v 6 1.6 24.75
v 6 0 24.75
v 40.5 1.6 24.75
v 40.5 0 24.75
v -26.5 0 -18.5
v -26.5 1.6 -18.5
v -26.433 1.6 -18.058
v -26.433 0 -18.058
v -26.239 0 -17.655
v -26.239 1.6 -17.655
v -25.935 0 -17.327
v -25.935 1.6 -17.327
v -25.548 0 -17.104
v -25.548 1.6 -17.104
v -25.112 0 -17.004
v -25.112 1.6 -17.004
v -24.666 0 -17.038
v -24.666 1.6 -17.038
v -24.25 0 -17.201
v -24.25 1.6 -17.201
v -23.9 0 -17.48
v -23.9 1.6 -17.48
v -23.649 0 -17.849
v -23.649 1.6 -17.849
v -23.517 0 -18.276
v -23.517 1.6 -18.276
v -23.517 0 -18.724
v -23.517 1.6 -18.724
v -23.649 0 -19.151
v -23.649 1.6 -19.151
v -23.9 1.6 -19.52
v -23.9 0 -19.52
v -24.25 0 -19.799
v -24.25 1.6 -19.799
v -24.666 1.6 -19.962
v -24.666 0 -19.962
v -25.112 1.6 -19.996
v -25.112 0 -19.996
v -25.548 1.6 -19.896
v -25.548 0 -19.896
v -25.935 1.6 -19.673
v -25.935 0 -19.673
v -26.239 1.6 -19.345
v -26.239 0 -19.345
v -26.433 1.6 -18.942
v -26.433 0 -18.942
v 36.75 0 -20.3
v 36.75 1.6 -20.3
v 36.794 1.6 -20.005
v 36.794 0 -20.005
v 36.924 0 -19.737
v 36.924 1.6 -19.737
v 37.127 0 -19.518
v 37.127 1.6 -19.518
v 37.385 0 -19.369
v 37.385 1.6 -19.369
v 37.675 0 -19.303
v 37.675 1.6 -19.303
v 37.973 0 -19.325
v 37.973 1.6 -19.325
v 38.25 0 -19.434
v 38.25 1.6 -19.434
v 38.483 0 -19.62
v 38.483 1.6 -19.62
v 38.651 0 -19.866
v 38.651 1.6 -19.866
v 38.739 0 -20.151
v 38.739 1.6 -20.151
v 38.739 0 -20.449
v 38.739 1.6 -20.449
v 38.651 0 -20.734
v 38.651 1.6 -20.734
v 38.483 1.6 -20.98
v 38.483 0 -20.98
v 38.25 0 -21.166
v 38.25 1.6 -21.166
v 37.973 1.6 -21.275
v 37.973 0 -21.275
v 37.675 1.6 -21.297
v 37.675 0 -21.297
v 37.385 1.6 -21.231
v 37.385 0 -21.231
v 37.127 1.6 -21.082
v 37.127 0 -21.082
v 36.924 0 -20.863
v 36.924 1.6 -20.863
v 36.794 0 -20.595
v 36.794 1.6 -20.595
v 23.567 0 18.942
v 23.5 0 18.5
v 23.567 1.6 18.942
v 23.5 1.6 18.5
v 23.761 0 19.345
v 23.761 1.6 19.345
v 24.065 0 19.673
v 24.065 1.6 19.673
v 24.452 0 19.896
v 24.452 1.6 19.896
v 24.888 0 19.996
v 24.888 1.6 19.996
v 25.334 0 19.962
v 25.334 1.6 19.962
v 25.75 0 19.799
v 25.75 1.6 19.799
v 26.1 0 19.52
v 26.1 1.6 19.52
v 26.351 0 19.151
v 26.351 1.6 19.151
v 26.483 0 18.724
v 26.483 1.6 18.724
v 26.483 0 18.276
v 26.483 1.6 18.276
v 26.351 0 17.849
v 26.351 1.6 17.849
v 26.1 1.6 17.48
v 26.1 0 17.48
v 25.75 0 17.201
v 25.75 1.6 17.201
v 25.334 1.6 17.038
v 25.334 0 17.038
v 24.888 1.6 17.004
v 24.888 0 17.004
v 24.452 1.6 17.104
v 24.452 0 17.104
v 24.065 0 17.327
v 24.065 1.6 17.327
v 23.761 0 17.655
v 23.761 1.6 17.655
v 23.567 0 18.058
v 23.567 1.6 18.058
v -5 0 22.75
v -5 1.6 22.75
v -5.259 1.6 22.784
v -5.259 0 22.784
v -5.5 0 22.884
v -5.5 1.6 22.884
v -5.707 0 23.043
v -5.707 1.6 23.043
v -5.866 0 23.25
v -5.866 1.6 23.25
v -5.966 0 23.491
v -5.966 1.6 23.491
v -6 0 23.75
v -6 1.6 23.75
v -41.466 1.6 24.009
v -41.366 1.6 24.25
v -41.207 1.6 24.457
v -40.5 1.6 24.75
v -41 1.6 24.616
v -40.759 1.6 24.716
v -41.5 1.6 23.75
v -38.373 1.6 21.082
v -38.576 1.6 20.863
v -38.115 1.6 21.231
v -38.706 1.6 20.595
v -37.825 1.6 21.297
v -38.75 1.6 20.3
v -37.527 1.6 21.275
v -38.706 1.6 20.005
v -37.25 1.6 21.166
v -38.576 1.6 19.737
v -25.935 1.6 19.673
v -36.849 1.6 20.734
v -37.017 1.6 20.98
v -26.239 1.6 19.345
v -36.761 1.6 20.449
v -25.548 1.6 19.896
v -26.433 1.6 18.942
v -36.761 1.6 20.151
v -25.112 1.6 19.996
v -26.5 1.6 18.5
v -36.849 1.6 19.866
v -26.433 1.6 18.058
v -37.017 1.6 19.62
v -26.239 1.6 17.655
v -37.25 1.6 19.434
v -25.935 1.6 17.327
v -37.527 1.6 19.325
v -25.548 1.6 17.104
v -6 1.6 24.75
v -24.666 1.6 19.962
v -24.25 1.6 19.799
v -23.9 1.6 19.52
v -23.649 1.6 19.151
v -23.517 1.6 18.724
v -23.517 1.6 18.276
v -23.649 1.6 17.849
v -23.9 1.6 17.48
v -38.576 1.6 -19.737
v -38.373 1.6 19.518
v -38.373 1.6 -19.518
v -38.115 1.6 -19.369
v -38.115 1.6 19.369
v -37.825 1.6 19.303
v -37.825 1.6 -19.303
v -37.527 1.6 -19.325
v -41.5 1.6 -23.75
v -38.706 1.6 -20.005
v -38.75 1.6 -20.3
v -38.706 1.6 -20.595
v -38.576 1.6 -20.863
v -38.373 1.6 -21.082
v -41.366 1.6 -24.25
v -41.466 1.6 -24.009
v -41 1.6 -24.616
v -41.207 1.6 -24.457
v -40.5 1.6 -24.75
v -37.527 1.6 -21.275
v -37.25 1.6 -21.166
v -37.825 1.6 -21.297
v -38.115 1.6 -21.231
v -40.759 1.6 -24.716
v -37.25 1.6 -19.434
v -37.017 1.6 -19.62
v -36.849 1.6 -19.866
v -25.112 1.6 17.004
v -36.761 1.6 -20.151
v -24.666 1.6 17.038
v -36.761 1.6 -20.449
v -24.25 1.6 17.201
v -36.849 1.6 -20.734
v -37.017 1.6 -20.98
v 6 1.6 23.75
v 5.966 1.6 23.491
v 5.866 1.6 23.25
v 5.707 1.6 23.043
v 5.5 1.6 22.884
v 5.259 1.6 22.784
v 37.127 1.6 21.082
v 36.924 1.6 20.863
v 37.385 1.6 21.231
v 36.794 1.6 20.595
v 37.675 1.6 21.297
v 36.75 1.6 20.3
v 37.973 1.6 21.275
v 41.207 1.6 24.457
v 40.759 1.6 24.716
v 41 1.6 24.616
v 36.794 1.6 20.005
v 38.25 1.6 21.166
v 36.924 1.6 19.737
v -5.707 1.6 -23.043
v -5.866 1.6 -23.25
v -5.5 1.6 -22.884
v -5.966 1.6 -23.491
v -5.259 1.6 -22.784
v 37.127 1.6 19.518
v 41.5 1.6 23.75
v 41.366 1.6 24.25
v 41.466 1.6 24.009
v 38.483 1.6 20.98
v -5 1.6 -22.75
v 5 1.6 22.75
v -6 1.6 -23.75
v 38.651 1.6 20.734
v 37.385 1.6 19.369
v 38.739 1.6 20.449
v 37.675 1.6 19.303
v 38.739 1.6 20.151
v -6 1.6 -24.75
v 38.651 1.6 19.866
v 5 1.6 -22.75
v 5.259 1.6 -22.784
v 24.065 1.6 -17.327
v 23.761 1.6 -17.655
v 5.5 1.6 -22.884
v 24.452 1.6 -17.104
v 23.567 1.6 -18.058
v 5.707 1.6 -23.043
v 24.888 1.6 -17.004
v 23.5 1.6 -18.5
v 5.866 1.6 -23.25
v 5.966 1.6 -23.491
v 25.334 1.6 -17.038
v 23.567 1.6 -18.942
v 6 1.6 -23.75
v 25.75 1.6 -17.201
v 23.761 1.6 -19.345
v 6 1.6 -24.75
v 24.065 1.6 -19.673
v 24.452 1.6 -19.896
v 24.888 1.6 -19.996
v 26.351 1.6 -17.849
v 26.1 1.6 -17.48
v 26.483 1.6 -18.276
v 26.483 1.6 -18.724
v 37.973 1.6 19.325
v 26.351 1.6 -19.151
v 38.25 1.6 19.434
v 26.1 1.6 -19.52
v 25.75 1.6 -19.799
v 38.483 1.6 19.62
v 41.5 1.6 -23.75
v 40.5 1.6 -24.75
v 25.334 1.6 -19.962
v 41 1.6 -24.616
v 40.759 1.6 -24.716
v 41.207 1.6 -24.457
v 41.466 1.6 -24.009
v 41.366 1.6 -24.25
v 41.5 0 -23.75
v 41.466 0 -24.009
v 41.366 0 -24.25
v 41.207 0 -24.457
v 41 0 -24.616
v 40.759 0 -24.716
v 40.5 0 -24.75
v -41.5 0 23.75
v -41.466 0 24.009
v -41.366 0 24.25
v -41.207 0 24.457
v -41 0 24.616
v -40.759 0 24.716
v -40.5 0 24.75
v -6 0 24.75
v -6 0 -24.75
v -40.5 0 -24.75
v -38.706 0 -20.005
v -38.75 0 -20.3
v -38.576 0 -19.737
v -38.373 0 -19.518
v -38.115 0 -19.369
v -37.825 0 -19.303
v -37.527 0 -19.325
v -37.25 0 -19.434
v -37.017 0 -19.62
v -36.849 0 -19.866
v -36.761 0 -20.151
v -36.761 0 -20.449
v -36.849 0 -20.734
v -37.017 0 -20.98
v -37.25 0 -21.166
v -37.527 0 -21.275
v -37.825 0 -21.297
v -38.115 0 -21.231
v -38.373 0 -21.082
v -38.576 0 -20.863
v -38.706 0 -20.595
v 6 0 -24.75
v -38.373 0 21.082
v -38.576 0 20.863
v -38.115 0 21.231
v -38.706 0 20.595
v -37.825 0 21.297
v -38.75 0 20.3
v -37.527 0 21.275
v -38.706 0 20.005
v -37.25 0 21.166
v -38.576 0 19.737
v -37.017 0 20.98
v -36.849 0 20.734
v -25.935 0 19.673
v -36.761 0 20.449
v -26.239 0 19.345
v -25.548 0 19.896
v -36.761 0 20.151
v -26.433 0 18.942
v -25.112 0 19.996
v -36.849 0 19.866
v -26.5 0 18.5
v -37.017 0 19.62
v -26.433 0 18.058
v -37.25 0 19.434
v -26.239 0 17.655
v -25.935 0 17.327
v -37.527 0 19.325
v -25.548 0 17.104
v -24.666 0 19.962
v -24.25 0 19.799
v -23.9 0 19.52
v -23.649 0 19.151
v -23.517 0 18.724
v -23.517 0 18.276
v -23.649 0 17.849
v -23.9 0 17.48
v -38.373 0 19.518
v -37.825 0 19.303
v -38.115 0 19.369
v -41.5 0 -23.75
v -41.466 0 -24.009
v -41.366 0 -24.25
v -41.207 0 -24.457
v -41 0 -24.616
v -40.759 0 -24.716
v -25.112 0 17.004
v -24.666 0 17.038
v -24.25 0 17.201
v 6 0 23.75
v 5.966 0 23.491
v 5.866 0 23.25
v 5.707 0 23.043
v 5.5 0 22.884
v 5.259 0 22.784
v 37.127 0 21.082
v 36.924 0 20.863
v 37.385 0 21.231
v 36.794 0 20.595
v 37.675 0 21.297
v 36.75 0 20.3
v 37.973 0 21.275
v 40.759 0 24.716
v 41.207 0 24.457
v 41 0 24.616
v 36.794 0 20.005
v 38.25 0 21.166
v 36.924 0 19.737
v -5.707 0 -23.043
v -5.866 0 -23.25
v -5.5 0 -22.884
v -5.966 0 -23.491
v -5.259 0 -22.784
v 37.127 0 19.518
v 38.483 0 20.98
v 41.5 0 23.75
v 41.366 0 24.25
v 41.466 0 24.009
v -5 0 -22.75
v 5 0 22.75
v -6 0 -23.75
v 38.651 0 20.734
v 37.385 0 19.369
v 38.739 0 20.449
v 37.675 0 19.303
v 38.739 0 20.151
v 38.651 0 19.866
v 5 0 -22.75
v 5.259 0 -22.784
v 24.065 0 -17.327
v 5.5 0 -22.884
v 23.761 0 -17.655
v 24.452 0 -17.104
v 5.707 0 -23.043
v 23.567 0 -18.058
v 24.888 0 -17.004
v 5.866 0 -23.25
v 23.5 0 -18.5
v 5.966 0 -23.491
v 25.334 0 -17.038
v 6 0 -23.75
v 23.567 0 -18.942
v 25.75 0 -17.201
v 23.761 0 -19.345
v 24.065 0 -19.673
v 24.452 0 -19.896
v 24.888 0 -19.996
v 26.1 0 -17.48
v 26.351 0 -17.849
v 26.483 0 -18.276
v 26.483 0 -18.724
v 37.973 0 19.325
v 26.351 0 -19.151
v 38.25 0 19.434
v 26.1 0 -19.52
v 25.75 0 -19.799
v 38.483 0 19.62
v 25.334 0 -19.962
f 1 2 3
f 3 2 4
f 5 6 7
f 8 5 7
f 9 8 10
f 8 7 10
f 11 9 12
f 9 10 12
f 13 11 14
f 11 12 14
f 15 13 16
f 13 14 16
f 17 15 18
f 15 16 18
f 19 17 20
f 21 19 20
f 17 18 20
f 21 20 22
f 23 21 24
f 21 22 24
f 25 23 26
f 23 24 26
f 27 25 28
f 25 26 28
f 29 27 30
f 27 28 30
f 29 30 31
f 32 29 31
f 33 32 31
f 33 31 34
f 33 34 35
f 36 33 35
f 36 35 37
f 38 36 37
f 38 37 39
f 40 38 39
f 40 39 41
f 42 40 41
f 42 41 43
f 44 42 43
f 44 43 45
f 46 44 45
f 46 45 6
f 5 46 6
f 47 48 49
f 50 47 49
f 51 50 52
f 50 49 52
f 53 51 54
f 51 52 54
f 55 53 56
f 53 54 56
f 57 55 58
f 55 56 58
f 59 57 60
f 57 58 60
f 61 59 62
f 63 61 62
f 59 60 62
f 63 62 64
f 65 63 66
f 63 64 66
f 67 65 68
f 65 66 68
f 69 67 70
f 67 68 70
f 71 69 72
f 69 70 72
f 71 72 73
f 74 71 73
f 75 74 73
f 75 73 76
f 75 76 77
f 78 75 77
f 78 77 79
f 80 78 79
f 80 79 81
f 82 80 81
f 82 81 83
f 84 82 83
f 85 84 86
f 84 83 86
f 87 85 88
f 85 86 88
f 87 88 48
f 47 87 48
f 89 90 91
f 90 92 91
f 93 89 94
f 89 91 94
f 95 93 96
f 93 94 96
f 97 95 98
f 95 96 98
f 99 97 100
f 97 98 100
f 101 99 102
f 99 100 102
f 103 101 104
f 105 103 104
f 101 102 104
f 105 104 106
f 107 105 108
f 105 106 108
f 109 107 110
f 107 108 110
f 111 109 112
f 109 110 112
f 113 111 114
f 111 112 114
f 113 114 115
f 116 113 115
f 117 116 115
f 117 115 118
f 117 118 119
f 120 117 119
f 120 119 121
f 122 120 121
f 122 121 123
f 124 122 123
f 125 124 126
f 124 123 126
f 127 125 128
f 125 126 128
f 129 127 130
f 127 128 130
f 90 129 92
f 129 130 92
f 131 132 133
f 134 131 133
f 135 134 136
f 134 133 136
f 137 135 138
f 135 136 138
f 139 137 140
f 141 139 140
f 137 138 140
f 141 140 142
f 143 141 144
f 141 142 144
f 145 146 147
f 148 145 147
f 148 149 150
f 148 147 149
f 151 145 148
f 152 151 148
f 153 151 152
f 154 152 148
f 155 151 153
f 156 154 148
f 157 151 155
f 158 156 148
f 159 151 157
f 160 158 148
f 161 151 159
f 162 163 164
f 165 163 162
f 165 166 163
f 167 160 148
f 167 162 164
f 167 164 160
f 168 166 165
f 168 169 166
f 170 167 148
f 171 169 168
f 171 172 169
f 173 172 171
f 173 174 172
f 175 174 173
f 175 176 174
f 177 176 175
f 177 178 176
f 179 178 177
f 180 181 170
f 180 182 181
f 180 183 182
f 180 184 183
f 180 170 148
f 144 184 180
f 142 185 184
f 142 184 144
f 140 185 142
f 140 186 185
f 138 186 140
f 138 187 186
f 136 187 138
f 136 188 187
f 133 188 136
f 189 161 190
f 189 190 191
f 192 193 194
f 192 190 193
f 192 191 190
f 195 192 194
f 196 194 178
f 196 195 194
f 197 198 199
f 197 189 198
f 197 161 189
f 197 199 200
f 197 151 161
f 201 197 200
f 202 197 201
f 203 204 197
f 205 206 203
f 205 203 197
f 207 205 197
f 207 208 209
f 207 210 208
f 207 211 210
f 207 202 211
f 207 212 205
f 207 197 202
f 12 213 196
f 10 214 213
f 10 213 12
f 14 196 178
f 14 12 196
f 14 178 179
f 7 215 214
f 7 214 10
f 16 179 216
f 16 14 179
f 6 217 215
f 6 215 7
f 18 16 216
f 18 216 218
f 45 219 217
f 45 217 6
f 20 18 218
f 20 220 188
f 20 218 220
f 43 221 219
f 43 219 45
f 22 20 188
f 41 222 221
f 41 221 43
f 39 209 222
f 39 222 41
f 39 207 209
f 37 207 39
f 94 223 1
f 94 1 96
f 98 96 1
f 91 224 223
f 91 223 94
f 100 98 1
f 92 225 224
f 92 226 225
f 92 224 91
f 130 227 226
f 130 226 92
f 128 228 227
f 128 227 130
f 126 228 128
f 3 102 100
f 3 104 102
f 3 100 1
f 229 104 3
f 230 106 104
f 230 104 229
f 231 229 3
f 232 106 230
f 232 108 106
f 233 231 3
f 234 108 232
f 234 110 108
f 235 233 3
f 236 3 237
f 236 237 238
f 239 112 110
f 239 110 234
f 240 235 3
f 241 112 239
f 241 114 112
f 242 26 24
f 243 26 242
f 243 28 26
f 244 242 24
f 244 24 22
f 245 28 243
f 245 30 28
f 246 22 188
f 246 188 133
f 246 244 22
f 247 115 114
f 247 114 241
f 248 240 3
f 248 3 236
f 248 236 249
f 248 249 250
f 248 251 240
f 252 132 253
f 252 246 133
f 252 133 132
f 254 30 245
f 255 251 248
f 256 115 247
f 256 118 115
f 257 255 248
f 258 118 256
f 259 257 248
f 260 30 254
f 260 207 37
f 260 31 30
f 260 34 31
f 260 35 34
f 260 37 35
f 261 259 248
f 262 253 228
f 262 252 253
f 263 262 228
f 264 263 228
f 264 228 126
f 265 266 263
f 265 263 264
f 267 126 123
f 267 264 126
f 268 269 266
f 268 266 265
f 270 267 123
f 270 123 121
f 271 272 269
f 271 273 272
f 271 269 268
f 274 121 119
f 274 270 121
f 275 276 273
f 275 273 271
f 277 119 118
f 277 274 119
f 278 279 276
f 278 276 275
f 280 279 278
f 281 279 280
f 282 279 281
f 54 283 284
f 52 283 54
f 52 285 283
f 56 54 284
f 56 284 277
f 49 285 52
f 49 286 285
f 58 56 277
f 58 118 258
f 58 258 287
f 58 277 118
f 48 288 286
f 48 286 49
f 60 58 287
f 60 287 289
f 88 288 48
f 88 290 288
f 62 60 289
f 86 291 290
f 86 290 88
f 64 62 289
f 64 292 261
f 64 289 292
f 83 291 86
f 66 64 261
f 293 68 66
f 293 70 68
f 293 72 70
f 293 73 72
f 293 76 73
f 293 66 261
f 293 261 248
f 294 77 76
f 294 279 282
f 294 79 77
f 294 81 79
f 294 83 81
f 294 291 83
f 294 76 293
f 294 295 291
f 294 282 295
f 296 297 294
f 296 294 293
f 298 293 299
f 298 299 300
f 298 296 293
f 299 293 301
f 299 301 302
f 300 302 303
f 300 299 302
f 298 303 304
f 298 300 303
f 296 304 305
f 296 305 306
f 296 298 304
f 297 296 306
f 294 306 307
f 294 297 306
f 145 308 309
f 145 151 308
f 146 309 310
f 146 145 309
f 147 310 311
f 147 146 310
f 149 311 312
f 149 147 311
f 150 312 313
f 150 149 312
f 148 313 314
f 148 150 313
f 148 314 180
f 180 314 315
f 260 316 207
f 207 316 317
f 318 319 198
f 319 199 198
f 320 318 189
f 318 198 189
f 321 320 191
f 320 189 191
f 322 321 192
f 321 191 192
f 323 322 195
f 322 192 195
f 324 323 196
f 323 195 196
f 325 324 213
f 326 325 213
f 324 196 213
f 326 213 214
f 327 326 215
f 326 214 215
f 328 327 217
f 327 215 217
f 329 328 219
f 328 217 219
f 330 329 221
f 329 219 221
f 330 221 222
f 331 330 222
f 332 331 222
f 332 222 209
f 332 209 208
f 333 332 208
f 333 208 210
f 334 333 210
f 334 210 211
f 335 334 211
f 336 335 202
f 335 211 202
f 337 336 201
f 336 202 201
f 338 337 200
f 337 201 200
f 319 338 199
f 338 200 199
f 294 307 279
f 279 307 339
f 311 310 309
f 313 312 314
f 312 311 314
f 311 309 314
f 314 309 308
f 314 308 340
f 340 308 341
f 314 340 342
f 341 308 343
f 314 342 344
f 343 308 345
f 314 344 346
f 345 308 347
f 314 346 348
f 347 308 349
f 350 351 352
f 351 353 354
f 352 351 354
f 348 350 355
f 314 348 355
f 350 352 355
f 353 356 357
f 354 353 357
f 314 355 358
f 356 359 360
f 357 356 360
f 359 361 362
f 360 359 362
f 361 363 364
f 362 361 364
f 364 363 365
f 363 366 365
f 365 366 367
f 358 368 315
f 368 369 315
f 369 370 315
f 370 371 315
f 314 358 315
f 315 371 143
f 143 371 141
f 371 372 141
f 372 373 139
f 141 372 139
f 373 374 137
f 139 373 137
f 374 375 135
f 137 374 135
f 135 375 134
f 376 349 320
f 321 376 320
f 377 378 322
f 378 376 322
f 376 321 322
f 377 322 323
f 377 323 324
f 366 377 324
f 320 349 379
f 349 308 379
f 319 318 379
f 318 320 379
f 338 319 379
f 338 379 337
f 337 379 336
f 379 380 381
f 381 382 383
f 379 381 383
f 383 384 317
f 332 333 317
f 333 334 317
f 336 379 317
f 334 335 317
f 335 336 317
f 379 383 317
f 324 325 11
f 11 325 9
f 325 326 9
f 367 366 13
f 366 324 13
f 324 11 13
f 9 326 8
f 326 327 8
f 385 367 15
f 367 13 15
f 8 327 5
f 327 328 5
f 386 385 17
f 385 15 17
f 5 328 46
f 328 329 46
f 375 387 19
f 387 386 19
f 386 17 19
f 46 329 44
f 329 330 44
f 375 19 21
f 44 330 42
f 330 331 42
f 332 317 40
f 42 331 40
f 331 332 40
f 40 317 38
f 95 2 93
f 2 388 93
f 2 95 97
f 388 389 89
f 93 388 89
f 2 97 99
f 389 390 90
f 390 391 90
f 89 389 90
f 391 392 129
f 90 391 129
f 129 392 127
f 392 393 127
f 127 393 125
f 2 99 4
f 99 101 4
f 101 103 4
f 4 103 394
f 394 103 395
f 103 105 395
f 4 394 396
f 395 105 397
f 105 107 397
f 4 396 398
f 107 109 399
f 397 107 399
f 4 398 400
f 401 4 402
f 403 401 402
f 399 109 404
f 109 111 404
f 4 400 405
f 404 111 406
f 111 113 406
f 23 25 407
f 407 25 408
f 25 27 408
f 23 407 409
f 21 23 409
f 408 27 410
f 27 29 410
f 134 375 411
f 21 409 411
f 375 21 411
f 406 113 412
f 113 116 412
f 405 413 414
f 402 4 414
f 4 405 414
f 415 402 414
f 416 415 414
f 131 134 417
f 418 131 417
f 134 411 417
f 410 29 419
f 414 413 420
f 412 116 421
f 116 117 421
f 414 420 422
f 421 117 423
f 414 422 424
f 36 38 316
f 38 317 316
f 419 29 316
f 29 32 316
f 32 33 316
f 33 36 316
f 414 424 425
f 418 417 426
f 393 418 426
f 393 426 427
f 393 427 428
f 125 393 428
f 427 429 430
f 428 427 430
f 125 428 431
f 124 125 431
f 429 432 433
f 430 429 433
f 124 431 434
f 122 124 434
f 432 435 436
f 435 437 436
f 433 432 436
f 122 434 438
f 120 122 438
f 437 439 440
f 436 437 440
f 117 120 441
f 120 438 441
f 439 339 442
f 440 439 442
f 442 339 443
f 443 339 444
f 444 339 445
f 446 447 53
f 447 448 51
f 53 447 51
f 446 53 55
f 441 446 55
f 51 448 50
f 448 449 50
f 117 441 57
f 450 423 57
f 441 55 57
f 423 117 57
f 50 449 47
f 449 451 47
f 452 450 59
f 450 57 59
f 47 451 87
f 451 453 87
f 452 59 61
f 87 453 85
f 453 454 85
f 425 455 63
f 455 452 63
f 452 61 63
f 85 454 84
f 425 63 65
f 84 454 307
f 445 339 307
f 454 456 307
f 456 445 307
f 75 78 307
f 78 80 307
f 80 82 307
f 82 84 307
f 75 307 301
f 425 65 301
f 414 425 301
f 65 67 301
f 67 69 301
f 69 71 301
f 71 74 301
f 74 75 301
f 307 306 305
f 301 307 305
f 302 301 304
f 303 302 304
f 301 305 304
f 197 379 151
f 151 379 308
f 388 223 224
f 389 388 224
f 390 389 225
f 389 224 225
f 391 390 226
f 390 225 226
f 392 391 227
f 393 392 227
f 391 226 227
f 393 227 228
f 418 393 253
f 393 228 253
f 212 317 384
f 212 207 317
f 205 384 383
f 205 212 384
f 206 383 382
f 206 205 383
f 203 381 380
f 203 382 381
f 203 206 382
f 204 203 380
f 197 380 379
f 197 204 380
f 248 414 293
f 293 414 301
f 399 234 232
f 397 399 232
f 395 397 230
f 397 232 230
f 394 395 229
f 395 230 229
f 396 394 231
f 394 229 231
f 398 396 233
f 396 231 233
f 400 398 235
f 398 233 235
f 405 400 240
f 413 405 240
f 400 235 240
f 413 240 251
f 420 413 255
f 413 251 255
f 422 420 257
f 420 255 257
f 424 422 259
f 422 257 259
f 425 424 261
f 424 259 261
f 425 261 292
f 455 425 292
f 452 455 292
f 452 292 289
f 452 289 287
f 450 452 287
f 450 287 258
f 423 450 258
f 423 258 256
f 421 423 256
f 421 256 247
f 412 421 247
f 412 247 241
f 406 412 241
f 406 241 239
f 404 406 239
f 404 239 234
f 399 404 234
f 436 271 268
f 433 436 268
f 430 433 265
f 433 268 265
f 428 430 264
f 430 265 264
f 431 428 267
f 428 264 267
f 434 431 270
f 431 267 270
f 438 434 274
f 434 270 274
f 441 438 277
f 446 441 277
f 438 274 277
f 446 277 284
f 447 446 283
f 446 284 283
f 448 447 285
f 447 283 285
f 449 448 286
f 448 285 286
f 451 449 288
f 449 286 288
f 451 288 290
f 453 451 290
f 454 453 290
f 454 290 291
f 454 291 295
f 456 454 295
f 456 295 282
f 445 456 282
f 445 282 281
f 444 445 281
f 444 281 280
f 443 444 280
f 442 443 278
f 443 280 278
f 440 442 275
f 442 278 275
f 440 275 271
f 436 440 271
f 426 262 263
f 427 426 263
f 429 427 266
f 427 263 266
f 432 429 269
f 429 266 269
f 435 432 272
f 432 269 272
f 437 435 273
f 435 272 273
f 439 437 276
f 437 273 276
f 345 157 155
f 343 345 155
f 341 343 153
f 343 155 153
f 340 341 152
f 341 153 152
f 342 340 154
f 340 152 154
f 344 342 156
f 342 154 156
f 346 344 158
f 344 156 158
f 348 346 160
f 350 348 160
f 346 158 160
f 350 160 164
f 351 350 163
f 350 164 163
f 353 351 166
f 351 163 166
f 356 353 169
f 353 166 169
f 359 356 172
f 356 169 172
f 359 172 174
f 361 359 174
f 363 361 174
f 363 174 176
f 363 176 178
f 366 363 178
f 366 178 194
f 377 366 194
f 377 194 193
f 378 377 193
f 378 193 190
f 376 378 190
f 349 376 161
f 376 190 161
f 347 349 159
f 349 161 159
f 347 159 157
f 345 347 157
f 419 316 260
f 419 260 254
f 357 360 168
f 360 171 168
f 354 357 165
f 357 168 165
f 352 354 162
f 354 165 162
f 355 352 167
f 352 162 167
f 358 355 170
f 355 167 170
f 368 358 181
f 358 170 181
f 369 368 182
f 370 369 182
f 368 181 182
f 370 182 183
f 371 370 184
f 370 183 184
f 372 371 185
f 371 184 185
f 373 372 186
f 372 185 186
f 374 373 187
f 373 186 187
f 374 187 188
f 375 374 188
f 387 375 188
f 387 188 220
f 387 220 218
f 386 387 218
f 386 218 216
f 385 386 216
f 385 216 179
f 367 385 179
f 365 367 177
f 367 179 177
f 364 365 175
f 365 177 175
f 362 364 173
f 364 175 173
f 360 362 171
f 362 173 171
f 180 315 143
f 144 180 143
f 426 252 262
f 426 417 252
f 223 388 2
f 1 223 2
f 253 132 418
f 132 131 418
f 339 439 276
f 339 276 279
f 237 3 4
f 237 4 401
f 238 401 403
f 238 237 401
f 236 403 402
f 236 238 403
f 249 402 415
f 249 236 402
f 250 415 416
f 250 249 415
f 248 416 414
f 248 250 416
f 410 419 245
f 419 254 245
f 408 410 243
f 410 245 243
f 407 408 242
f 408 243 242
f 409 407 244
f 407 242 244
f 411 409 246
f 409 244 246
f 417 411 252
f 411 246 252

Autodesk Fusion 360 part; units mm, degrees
sketch "Sketch1" plane through (0, 0, 0) normal (0, 1, 0) x (1, 0, 0)
  line L0 (41.5, 24.75) -> (-41.5, 24.75)
  line L1 (-41.5, 24.75) -> (-41.5, -24.75)
  line L2 (-41.5, -24.75) -> (41.5, -24.75)
  line L3 (41.5, -24.75) -> (41.5, 24.75)
  line L4 (41.5, 24.75) -> (-41.5, -24.75) construction
  line L5 (-41.5, 24.75) -> (41.5, -24.75) construction
  line L6 (6, 26.75) -> (-6, 26.75)
  line L7 (-6, 26.75) -> (-6, 22.75)
  line L8 (-6, 22.75) -> (6, 22.75)
  line L9 (6, 22.75) -> (6, 26.75)
  line L10 (6, 26.75) -> (-6, 22.75) construction
  line L11 (-6, 26.75) -> (6, 22.75) construction
  line L12 (6, -26.75) -> (-6, -26.75)
  line L13 (-6, -26.75) -> (-6, -22.75)
  line L14 (-6, -22.75) -> (6, -22.75)
  line L15 (6, -22.75) -> (6, -26.75)
  point P0 (0, 24.75)
  dimension "d1" = 83
  dimension "d2" = 49.5
  dimension "d3" = 12
  dimension "d4" = 4
extrude "Extrude1" add sketch "Sketch1" along normal blind 1.6 contours L0 L1 L2 L3 L7 L8 L9 L13 L14 L15
fillet "Fillet1" radius 1 4 edges at (6, 0.8, 22.75) (-6, 0.8, 22.75) (6, 0.8, -22.75) (-6, 0.8, -22.75)
fillet "Fillet2" radius 1 4 edges at (-41.5, 0.8, -24.75) (-41.5, 0.8, 24.75) (41.5, 0.8, 24.75) (41.5, 0.8, -24.75)
sketch "Sketch2" plane through (0, 1.6, 0) normal (0, 1, 0) x (-1, 0, 0)
  arc A0 (-41.5, -23.75) -> (-40.5, -24.75) centre (-40.5, -23.75) ccw
  line L0 (-40.5, -24.75) -> (-6, -24.75)
  line L1 (-6, -24.75) -> (-6, -23.75)
  arc A1 (-5, -22.75) -> (-6, -23.75) centre (-5, -23.75) ccw
  line L2 (-5, -22.75) -> (5, -22.75)
  arc A2 (6, -23.75) -> (5, -22.75) centre (5, -23.75) ccw
  line L3 (6, -23.75) -> (6, -24.75)
  line L4 (6, -24.75) -> (40.5, -24.75)
  arc A3 (40.5, -24.75) -> (41.5, -23.75) centre (40.5, -23.75) ccw
  line L5 (41.5, -23.75) -> (41.5, 23.75)
  arc A4 (41.5, 23.75) -> (40.5, 24.75) centre (40.5, 23.75) ccw
  line L6 (40.5, 24.75) -> (6, 24.75)
  line L7 (6, 24.75) -> (6, 23.75)
  arc A5 (5, 22.75) -> (6, 23.75) centre (5, 23.75) ccw
  line L8 (5, 22.75) -> (-5, 22.75)
  arc A6 (-6, 23.75) -> (-5, 22.75) centre (-5, 23.75) ccw
  line L9 (-6, 23.75) -> (-6, 24.75)
  line L10 (-6, 24.75) -> (-40.5, 24.75)
  arc A7 (-40.5, 24.75) -> (-41.5, 23.75) centre (-40.5, 23.75) ccw
  line L11 (-41.5, 23.75) -> (-41.5, -23.75)
  circle A8 centre (25, 18.5) radius 1.5
  circle A9 centre (25, -18.5) radius 1.5
  circle A10 centre (-25, -18.5) radius 1.5
  circle A11 centre (-25, 18.5) radius 1.5
  dimension "d11" = 50
  dimension "d12" = 37
  dimension "d13" = 3
  dimension "d14" = 3
  dimension "d15" = 3
  dimension "d16" = 3
extrude "Extrude2" cut sketch "Sketch2" against normal blind 6 contours A8 | A9 | A10 | A11
sketch "Sketch3" plane through (0, 1.6, 0) normal (0, 1, 0) x (-1, 0, 0)
  circle A0 centre (25, 18.5) radius 1.5
  circle A1 centre (-25, 18.5) radius 1.5
  circle A2 centre (25, -18.5) radius 1.5
  circle A3 centre (-25, -18.5) radius 1.5
  arc A4 (-41.5, -23.75) -> (-40.5, -24.75) centre (-40.5, -23.75) ccw
  line L0 (-40.5, -24.75) -> (-6, -24.75)
  line L1 (-6, -24.75) -> (-6, -23.75)
  arc A5 (-5, -22.75) -> (-6, -23.75) centre (-5, -23.75) ccw
  line L2 (-5, -22.75) -> (5, -22.75)
  arc A6 (6, -23.75) -> (5, -22.75) centre (5, -23.75) ccw
  line L3 (6, -23.75) -> (6, -24.75)
  line L4 (6, -24.75) -> (40.5, -24.75)
  arc A7 (40.5, -24.75) -> (41.5, -23.75) centre (40.5, -23.75) ccw
  line L5 (41.5, -23.75) -> (41.5, 23.75)
  arc A8 (41.5, 23.75) -> (40.5, 24.75) centre (40.5, 23.75) ccw
  line L6 (40.5, 24.75) -> (6, 24.75)
  line L7 (6, 24.75) -> (6, 23.75)
  arc A9 (5, 22.75) -> (6, 23.75) centre (5, 23.75) ccw
  line L8 (5, 22.75) -> (-5, 22.75)
  arc A10 (-6, 23.75) -> (-5, 22.75) centre (-5, 23.75) ccw
  line L9 (-6, 23.75) -> (-6, 24.75)
  line L10 (-6, 24.75) -> (-40.5, 24.75)
  arc A11 (-40.5, 24.75) -> (-41.5, 23.75) centre (-40.5, 23.75) ccw
  line L11 (-41.5, 23.75) -> (-41.5, -23.75)
  circle A12 centre (37.75, 20.3) radius 1
  circle A13 centre (37.75, -20.3) radius 1
  circle A14 centre (-37.75, 20.3) radius 1
  circle A15 centre (-37.75, -20.3) radius 1
  dimension "d19" = 75.5
  dimension "d20" = 40.6
  dimension "d21" = 2
  dimension "d22" = 2
  dimension "d23" = 2
  dimension "d24" = 2
extrude "Extrude3" cut sketch "Sketch3" against normal blind 2 contours A12 | A13 | A14 | A15
sketch "Sketch4" plane through (0, 1.6, 0) normal (0, 1, 0) x (-1, 0, 0)
  circle A0 centre (37.75, 20.3) radius 1
  circle A1 centre (37.75, -20.3) radius 1
  circle A2 centre (-37.75, 20.3) radius 1
  circle A3 centre (-37.75, -20.3) radius 1
  circle A4 centre (25, 18.5) radius 1.5
  circle A5 centre (-25, 18.5) radius 1.5
  circle A6 centre (25, -18.5) radius 1.5
  circle A7 centre (-25, -18.5) radius 1.5
  arc A8 (-41.5, -23.75) -> (-40.5, -24.75) centre (-40.5, -23.75) ccw
  line L0 (-40.5, -24.75) -> (-6, -24.75)
  line L1 (-6, -24.75) -> (-6, -23.75)
  arc A9 (-5, -22.75) -> (-6, -23.75) centre (-5, -23.75) ccw
  line L2 (-5, -22.75) -> (5, -22.75)
  arc A10 (6, -23.75) -> (5, -22.75) centre (5, -23.75) ccw
  line L3 (6, -23.75) -> (6, -24.75)
  line L4 (6, -24.75) -> (40.5, -24.75)
  arc A11 (40.5, -24.75) -> (41.5, -23.75) centre (40.5, -23.75) ccw
  line L5 (41.5, -23.75) -> (41.5, 23.75)
  arc A12 (41.5, 23.75) -> (40.5, 24.75) centre (40.5, 23.75) ccw
  line L6 (40.5, 24.75) -> (6, 24.75)
  line L7 (6, 24.75) -> (6, 23.75)
  arc A13 (5, 22.75) -> (6, 23.75) centre (5, 23.75) ccw
  line L8 (5, 22.75) -> (-5, 22.75)
  arc A14 (-6, 23.75) -> (-5, 22.75) centre (-5, 23.75) ccw
  line L9 (-6, 23.75) -> (-6, 24.75)
  line L10 (-6, 24.75) -> (-40.5, 24.75)
  arc A15 (-40.5, 24.75) -> (-41.5, 23.75) centre (-40.5, 23.75) ccw
  line L11 (-41.5, 23.75) -> (-41.5, -23.75)
